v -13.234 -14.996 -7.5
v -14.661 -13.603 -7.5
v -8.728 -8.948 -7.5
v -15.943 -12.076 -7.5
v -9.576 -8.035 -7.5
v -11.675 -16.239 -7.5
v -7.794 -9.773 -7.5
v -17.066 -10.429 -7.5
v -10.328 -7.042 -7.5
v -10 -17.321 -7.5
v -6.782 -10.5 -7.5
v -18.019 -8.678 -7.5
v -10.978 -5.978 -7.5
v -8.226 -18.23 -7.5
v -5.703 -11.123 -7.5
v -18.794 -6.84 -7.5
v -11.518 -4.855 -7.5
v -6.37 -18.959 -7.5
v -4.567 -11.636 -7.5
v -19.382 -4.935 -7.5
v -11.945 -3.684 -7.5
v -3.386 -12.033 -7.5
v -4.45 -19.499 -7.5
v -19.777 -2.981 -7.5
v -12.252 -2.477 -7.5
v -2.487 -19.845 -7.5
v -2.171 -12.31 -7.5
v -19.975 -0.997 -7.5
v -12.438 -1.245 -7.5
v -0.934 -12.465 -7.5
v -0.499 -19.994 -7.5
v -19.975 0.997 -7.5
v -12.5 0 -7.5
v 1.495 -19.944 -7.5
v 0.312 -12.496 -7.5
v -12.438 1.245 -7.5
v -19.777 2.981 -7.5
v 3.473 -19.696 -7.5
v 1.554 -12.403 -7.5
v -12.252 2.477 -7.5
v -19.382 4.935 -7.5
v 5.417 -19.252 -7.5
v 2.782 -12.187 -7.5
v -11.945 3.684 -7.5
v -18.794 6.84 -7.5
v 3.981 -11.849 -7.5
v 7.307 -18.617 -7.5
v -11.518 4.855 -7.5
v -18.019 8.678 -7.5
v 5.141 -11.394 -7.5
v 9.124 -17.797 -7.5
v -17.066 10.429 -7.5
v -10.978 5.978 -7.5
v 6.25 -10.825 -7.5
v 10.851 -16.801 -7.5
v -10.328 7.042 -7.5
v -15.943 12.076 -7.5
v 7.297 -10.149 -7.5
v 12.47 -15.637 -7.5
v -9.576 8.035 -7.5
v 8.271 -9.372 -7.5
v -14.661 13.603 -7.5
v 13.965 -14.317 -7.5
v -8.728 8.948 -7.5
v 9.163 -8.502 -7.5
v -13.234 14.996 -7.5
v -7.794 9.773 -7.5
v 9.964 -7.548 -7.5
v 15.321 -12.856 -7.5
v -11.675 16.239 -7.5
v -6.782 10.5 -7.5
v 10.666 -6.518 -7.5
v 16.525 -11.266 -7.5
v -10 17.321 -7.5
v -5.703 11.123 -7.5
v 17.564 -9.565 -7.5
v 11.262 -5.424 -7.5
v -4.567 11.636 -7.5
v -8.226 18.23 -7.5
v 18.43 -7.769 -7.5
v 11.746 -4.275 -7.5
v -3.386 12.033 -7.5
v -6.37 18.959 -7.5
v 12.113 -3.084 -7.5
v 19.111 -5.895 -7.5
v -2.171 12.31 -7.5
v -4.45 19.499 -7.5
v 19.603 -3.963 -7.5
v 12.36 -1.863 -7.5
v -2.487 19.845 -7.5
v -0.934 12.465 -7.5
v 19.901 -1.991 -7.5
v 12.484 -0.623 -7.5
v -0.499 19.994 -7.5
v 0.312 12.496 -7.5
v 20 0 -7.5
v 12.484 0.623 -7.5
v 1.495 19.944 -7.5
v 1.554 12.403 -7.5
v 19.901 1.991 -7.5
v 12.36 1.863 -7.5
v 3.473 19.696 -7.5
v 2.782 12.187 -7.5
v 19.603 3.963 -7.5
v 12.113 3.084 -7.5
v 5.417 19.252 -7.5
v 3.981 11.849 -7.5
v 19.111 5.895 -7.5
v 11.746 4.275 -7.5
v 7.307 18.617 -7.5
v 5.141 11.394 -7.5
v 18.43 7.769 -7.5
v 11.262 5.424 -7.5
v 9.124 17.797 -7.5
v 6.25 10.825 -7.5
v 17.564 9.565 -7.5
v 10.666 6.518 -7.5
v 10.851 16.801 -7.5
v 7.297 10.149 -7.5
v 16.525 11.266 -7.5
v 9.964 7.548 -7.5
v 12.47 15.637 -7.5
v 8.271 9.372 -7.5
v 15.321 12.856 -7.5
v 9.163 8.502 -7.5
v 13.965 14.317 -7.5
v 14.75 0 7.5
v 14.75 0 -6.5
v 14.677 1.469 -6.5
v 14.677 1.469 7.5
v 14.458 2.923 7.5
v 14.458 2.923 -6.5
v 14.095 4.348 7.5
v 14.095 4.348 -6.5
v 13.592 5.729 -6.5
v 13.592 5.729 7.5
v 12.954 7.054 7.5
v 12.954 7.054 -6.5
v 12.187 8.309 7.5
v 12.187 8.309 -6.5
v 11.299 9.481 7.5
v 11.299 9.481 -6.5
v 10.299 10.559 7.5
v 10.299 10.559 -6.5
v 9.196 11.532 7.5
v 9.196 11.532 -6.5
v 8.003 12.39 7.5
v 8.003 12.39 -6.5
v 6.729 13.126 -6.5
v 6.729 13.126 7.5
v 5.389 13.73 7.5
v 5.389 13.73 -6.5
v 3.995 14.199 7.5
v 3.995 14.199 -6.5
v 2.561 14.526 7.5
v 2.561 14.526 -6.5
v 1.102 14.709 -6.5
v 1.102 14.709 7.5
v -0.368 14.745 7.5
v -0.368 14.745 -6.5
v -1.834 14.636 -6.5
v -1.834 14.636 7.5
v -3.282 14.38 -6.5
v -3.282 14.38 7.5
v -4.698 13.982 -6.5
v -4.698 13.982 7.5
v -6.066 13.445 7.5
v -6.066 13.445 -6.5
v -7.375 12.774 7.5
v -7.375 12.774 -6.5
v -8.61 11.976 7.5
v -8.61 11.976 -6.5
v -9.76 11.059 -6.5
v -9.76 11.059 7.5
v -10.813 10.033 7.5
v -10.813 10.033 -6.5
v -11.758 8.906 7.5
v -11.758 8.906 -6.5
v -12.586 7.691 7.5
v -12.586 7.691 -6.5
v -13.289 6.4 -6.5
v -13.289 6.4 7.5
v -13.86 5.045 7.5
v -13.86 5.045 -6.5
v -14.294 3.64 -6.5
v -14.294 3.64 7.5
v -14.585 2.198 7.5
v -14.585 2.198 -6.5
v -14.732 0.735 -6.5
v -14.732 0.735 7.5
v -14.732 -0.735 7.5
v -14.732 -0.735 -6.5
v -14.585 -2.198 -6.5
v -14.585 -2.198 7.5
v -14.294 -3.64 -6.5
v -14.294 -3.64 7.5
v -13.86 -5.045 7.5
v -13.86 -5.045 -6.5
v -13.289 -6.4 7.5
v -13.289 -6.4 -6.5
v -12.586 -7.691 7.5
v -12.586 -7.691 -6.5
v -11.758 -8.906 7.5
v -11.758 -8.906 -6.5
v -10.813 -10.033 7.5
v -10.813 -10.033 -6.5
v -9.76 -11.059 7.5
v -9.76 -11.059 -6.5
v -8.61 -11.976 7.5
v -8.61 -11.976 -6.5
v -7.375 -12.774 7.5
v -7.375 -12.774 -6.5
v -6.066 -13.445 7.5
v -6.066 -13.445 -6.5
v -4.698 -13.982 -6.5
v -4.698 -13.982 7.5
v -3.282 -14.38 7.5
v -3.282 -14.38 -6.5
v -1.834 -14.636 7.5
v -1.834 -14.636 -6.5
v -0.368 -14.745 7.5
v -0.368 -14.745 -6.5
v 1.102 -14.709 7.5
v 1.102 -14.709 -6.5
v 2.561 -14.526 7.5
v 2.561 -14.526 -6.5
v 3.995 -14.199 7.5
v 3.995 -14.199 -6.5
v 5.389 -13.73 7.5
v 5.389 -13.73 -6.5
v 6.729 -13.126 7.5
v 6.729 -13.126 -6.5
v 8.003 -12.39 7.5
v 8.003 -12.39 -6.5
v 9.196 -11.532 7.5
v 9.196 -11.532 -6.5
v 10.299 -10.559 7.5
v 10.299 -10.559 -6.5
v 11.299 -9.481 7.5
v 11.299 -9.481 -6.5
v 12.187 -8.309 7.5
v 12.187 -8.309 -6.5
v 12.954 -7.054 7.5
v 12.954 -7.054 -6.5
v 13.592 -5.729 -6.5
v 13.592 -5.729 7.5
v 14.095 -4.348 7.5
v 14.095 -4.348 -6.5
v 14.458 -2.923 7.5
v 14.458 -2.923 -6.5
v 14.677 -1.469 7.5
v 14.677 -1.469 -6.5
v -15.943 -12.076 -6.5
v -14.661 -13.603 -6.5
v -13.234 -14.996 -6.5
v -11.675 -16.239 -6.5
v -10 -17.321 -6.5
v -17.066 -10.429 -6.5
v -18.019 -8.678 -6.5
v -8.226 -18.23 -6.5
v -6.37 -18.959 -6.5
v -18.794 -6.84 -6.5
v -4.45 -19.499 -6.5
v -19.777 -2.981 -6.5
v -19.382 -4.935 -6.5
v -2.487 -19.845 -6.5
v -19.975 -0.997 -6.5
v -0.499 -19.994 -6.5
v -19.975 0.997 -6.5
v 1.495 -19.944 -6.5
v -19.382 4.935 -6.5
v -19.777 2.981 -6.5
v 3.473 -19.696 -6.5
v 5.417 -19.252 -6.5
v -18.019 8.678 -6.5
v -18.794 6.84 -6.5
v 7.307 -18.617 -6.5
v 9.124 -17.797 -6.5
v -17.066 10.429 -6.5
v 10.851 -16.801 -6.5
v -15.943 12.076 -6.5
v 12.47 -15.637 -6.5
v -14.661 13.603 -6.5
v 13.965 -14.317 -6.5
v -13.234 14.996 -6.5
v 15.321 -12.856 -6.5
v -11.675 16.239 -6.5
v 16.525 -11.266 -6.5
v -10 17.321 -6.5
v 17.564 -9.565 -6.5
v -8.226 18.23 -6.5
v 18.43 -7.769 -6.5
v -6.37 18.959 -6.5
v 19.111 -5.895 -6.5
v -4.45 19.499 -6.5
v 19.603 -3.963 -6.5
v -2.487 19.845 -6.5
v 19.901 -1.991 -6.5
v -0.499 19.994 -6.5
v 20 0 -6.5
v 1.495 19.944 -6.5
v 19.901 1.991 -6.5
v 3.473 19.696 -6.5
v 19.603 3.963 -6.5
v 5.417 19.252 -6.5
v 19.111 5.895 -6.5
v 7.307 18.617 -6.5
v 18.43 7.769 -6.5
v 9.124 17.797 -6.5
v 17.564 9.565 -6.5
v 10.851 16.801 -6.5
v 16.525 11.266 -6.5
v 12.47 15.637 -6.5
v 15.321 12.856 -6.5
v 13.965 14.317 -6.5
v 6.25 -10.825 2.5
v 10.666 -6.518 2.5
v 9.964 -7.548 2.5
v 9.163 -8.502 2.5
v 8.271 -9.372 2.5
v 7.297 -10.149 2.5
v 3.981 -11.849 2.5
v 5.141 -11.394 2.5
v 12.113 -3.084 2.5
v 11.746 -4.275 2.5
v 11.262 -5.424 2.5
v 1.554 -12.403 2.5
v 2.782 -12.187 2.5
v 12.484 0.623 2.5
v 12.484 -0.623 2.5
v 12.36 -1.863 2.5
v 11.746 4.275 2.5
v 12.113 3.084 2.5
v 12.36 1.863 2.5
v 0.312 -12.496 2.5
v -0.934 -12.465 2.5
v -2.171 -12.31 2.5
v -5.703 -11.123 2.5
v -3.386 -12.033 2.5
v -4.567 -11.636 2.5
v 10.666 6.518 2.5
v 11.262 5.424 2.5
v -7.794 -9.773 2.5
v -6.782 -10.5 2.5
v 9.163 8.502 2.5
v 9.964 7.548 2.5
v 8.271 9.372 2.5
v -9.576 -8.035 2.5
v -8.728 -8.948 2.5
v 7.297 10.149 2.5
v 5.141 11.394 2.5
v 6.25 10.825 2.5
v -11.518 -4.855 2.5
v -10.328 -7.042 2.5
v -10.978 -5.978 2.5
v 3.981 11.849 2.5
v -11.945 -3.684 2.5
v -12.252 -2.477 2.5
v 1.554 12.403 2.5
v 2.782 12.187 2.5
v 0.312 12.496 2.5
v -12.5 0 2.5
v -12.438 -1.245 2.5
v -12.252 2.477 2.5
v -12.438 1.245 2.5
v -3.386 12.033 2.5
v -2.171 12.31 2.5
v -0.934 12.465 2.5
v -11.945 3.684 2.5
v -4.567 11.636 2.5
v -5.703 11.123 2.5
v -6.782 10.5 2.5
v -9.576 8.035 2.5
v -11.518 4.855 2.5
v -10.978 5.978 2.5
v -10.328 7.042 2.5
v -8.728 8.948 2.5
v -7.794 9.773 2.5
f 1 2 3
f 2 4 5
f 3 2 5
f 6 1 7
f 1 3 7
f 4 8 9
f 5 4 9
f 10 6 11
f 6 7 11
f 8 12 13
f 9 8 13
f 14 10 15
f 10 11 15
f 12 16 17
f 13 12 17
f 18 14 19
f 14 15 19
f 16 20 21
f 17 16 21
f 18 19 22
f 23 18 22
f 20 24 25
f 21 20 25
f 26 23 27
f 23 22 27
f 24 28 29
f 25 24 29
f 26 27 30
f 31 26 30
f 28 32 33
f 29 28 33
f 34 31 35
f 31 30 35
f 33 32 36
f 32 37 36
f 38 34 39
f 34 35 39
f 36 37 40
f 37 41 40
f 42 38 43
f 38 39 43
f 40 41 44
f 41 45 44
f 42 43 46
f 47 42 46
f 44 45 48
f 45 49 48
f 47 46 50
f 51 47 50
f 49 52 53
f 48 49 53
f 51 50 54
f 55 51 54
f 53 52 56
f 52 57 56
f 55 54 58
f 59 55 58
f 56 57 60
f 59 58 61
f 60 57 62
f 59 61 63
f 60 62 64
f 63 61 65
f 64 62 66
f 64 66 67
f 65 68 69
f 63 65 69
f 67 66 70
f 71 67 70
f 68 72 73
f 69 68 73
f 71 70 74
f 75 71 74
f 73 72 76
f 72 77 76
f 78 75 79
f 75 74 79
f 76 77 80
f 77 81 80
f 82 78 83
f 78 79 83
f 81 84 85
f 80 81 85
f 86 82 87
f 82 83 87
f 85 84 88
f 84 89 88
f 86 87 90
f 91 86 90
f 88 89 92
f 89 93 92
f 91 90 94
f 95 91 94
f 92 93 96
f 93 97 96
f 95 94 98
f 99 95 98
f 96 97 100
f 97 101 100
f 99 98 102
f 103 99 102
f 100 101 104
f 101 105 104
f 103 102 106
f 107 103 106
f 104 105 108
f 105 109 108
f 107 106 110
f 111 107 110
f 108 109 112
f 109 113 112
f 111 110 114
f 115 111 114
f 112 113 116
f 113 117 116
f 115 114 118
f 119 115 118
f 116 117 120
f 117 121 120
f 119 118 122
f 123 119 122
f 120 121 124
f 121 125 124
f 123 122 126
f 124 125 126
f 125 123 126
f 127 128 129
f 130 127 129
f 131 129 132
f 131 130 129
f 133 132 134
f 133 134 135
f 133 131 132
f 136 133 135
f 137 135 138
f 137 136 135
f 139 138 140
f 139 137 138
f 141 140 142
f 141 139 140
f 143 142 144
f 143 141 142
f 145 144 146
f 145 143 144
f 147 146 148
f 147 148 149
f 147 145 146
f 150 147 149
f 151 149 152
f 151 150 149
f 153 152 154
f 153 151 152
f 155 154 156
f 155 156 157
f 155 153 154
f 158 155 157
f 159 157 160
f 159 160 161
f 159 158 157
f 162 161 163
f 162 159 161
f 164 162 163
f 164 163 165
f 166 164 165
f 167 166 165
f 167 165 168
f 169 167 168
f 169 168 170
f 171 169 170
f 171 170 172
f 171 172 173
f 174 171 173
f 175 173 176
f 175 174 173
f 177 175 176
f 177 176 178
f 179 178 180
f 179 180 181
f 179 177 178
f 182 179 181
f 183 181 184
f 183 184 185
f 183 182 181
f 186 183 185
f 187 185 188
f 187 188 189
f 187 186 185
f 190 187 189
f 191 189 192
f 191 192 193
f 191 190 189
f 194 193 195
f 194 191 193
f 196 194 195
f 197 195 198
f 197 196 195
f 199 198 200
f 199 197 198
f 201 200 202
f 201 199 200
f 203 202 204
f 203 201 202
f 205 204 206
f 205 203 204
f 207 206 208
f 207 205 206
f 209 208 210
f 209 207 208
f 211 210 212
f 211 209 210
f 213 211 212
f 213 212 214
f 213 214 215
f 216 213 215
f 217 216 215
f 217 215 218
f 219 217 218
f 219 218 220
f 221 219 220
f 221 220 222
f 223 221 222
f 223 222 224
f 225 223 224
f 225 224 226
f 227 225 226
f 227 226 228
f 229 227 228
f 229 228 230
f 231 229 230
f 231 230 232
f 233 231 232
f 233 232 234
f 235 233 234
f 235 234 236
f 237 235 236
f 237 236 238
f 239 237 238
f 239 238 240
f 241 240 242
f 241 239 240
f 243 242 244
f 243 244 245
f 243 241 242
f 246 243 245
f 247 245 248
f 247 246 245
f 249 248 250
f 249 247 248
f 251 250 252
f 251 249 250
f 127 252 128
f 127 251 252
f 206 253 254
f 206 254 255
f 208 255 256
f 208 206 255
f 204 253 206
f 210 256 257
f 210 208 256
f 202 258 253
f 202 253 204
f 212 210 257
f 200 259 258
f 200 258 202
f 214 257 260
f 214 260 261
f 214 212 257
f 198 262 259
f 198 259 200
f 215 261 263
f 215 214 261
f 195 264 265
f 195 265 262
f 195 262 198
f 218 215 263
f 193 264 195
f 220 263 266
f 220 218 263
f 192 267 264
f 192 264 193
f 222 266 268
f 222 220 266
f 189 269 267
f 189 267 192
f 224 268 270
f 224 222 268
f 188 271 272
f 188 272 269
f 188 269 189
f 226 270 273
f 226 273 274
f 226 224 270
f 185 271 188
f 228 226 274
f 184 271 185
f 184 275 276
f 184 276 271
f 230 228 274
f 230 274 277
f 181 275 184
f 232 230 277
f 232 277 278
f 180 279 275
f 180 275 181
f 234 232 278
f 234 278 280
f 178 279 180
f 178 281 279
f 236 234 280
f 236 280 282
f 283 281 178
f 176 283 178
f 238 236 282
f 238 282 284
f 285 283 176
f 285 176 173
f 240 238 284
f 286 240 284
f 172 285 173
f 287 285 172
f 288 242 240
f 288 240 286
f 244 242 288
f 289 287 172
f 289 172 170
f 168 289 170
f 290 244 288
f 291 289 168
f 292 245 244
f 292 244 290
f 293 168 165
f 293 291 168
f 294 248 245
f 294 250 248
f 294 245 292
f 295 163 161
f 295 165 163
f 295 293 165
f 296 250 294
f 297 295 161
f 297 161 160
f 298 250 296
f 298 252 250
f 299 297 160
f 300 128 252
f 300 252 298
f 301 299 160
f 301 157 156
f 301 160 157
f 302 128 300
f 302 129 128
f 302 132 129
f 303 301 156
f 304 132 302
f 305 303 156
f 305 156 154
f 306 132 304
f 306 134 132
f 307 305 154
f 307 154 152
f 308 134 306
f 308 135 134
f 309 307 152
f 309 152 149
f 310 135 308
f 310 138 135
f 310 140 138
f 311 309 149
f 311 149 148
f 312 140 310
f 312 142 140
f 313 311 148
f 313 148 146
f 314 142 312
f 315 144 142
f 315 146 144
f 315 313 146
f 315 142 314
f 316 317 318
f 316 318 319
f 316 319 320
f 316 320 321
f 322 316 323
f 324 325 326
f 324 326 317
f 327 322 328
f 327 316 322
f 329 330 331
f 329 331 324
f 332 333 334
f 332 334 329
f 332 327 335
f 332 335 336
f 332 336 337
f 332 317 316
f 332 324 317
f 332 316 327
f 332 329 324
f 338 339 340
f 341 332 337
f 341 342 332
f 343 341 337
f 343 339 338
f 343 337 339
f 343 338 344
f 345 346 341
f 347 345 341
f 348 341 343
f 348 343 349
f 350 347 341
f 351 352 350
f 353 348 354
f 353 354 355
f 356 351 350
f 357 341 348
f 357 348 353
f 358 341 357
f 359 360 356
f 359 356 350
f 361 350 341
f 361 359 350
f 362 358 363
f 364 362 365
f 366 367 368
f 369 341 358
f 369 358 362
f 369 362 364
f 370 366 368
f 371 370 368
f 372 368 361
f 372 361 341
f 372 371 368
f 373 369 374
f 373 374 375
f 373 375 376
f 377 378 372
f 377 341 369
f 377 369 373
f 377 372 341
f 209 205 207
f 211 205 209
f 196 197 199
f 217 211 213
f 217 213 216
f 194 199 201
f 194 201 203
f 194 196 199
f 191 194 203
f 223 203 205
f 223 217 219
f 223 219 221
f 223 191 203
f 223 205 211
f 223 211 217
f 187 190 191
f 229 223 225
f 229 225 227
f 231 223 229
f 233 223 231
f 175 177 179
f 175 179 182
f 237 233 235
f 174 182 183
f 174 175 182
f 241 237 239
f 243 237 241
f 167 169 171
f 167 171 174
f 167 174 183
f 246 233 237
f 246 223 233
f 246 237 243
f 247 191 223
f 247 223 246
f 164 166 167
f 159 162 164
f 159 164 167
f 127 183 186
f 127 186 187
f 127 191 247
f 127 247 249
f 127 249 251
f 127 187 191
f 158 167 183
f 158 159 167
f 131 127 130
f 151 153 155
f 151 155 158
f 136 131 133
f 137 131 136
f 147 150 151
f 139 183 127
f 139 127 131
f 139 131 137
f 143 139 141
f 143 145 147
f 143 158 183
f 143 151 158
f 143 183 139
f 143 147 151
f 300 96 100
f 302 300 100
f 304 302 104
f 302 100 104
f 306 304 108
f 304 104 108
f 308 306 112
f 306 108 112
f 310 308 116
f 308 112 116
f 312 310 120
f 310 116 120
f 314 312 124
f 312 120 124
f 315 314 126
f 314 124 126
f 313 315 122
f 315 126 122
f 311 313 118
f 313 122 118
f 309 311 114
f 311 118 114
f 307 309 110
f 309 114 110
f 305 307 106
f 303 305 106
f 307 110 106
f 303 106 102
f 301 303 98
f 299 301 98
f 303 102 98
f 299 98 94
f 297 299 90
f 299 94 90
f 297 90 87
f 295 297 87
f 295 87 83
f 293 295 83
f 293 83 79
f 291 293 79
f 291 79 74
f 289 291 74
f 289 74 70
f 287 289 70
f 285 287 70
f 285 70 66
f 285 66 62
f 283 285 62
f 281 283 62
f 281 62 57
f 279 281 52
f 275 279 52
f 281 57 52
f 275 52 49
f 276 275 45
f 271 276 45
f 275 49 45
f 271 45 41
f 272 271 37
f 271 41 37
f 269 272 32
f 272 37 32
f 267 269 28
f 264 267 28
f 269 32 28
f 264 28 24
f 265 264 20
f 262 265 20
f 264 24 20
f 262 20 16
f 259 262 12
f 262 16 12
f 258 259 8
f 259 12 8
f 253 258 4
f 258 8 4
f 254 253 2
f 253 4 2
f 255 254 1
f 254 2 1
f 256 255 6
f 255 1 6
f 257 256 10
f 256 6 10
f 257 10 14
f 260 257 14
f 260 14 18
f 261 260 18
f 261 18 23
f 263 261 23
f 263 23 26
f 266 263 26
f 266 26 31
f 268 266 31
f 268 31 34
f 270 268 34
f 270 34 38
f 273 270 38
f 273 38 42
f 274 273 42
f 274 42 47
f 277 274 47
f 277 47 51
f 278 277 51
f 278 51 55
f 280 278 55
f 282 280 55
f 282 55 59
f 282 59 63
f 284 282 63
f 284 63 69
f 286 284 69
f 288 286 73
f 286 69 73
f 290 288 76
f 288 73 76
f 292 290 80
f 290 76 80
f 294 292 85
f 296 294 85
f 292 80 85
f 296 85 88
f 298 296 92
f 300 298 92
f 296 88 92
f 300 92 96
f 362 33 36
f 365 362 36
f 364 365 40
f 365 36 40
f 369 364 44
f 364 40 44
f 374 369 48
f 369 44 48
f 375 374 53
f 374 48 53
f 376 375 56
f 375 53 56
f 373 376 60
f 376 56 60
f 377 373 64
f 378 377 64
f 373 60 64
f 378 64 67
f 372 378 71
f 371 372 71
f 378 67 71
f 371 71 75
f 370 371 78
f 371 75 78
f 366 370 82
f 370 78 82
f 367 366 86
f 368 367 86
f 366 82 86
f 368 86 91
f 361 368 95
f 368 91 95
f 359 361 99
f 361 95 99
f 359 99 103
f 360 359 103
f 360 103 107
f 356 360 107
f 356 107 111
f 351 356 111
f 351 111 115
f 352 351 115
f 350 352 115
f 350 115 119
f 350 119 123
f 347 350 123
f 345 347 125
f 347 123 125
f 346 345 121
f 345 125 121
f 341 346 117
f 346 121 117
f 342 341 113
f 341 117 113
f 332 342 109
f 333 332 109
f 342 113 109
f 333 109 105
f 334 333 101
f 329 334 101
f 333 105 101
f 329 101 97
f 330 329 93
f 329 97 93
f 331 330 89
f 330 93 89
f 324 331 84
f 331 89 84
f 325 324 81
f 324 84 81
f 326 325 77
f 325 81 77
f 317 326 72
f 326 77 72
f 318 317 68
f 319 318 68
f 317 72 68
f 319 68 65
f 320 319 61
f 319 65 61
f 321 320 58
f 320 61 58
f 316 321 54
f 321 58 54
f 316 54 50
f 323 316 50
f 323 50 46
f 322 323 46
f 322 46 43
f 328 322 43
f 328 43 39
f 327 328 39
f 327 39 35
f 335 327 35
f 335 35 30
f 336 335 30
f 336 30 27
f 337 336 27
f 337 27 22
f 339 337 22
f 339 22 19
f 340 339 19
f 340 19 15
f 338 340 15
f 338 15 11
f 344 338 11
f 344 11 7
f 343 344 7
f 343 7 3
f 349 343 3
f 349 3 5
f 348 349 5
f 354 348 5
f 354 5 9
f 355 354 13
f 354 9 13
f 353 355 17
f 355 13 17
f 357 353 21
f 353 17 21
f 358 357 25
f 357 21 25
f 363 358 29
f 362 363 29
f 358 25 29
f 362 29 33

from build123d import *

# Parameters (mm, degrees)
SKETCH2_R           = 14.75
BOSS_EXTRUDE1_DEPTH = 7.5
BOSS_EXTRUDE2_START = -7.5
SKETCH3_R           = 20
BOSS_EXTRUDE2_DEPTH = 1
SKETCH4_R           = 12.5
CUT_EXTRUDE1_DEPTH  = 10


with BuildPart() as part:
    # Sketch2 → Boss-Extrude1 (new body, symmetric)
    with BuildSketch(Plane.XY):
        Circle(SKETCH2_R)
    extrude(amount=BOSS_EXTRUDE1_DEPTH, both=True)

    # Sketch3 → Boss-Extrude2 (add)
    with BuildSketch(Plane.XY.offset(BOSS_EXTRUDE2_START)):
        Circle(SKETCH3_R)
    extrude(amount=BOSS_EXTRUDE2_DEPTH)

    # Sketch4 → Cut-Extrude1 (cut)
    with BuildSketch(Plane(origin=(0, 0, -7.5), x_dir=(-1, 0, 0), z_dir=(0, 0, -1))):
        Circle(SKETCH4_R)
    extrude(amount=-CUT_EXTRUDE1_DEPTH, mode=Mode.SUBTRACT)


solid = part.part
